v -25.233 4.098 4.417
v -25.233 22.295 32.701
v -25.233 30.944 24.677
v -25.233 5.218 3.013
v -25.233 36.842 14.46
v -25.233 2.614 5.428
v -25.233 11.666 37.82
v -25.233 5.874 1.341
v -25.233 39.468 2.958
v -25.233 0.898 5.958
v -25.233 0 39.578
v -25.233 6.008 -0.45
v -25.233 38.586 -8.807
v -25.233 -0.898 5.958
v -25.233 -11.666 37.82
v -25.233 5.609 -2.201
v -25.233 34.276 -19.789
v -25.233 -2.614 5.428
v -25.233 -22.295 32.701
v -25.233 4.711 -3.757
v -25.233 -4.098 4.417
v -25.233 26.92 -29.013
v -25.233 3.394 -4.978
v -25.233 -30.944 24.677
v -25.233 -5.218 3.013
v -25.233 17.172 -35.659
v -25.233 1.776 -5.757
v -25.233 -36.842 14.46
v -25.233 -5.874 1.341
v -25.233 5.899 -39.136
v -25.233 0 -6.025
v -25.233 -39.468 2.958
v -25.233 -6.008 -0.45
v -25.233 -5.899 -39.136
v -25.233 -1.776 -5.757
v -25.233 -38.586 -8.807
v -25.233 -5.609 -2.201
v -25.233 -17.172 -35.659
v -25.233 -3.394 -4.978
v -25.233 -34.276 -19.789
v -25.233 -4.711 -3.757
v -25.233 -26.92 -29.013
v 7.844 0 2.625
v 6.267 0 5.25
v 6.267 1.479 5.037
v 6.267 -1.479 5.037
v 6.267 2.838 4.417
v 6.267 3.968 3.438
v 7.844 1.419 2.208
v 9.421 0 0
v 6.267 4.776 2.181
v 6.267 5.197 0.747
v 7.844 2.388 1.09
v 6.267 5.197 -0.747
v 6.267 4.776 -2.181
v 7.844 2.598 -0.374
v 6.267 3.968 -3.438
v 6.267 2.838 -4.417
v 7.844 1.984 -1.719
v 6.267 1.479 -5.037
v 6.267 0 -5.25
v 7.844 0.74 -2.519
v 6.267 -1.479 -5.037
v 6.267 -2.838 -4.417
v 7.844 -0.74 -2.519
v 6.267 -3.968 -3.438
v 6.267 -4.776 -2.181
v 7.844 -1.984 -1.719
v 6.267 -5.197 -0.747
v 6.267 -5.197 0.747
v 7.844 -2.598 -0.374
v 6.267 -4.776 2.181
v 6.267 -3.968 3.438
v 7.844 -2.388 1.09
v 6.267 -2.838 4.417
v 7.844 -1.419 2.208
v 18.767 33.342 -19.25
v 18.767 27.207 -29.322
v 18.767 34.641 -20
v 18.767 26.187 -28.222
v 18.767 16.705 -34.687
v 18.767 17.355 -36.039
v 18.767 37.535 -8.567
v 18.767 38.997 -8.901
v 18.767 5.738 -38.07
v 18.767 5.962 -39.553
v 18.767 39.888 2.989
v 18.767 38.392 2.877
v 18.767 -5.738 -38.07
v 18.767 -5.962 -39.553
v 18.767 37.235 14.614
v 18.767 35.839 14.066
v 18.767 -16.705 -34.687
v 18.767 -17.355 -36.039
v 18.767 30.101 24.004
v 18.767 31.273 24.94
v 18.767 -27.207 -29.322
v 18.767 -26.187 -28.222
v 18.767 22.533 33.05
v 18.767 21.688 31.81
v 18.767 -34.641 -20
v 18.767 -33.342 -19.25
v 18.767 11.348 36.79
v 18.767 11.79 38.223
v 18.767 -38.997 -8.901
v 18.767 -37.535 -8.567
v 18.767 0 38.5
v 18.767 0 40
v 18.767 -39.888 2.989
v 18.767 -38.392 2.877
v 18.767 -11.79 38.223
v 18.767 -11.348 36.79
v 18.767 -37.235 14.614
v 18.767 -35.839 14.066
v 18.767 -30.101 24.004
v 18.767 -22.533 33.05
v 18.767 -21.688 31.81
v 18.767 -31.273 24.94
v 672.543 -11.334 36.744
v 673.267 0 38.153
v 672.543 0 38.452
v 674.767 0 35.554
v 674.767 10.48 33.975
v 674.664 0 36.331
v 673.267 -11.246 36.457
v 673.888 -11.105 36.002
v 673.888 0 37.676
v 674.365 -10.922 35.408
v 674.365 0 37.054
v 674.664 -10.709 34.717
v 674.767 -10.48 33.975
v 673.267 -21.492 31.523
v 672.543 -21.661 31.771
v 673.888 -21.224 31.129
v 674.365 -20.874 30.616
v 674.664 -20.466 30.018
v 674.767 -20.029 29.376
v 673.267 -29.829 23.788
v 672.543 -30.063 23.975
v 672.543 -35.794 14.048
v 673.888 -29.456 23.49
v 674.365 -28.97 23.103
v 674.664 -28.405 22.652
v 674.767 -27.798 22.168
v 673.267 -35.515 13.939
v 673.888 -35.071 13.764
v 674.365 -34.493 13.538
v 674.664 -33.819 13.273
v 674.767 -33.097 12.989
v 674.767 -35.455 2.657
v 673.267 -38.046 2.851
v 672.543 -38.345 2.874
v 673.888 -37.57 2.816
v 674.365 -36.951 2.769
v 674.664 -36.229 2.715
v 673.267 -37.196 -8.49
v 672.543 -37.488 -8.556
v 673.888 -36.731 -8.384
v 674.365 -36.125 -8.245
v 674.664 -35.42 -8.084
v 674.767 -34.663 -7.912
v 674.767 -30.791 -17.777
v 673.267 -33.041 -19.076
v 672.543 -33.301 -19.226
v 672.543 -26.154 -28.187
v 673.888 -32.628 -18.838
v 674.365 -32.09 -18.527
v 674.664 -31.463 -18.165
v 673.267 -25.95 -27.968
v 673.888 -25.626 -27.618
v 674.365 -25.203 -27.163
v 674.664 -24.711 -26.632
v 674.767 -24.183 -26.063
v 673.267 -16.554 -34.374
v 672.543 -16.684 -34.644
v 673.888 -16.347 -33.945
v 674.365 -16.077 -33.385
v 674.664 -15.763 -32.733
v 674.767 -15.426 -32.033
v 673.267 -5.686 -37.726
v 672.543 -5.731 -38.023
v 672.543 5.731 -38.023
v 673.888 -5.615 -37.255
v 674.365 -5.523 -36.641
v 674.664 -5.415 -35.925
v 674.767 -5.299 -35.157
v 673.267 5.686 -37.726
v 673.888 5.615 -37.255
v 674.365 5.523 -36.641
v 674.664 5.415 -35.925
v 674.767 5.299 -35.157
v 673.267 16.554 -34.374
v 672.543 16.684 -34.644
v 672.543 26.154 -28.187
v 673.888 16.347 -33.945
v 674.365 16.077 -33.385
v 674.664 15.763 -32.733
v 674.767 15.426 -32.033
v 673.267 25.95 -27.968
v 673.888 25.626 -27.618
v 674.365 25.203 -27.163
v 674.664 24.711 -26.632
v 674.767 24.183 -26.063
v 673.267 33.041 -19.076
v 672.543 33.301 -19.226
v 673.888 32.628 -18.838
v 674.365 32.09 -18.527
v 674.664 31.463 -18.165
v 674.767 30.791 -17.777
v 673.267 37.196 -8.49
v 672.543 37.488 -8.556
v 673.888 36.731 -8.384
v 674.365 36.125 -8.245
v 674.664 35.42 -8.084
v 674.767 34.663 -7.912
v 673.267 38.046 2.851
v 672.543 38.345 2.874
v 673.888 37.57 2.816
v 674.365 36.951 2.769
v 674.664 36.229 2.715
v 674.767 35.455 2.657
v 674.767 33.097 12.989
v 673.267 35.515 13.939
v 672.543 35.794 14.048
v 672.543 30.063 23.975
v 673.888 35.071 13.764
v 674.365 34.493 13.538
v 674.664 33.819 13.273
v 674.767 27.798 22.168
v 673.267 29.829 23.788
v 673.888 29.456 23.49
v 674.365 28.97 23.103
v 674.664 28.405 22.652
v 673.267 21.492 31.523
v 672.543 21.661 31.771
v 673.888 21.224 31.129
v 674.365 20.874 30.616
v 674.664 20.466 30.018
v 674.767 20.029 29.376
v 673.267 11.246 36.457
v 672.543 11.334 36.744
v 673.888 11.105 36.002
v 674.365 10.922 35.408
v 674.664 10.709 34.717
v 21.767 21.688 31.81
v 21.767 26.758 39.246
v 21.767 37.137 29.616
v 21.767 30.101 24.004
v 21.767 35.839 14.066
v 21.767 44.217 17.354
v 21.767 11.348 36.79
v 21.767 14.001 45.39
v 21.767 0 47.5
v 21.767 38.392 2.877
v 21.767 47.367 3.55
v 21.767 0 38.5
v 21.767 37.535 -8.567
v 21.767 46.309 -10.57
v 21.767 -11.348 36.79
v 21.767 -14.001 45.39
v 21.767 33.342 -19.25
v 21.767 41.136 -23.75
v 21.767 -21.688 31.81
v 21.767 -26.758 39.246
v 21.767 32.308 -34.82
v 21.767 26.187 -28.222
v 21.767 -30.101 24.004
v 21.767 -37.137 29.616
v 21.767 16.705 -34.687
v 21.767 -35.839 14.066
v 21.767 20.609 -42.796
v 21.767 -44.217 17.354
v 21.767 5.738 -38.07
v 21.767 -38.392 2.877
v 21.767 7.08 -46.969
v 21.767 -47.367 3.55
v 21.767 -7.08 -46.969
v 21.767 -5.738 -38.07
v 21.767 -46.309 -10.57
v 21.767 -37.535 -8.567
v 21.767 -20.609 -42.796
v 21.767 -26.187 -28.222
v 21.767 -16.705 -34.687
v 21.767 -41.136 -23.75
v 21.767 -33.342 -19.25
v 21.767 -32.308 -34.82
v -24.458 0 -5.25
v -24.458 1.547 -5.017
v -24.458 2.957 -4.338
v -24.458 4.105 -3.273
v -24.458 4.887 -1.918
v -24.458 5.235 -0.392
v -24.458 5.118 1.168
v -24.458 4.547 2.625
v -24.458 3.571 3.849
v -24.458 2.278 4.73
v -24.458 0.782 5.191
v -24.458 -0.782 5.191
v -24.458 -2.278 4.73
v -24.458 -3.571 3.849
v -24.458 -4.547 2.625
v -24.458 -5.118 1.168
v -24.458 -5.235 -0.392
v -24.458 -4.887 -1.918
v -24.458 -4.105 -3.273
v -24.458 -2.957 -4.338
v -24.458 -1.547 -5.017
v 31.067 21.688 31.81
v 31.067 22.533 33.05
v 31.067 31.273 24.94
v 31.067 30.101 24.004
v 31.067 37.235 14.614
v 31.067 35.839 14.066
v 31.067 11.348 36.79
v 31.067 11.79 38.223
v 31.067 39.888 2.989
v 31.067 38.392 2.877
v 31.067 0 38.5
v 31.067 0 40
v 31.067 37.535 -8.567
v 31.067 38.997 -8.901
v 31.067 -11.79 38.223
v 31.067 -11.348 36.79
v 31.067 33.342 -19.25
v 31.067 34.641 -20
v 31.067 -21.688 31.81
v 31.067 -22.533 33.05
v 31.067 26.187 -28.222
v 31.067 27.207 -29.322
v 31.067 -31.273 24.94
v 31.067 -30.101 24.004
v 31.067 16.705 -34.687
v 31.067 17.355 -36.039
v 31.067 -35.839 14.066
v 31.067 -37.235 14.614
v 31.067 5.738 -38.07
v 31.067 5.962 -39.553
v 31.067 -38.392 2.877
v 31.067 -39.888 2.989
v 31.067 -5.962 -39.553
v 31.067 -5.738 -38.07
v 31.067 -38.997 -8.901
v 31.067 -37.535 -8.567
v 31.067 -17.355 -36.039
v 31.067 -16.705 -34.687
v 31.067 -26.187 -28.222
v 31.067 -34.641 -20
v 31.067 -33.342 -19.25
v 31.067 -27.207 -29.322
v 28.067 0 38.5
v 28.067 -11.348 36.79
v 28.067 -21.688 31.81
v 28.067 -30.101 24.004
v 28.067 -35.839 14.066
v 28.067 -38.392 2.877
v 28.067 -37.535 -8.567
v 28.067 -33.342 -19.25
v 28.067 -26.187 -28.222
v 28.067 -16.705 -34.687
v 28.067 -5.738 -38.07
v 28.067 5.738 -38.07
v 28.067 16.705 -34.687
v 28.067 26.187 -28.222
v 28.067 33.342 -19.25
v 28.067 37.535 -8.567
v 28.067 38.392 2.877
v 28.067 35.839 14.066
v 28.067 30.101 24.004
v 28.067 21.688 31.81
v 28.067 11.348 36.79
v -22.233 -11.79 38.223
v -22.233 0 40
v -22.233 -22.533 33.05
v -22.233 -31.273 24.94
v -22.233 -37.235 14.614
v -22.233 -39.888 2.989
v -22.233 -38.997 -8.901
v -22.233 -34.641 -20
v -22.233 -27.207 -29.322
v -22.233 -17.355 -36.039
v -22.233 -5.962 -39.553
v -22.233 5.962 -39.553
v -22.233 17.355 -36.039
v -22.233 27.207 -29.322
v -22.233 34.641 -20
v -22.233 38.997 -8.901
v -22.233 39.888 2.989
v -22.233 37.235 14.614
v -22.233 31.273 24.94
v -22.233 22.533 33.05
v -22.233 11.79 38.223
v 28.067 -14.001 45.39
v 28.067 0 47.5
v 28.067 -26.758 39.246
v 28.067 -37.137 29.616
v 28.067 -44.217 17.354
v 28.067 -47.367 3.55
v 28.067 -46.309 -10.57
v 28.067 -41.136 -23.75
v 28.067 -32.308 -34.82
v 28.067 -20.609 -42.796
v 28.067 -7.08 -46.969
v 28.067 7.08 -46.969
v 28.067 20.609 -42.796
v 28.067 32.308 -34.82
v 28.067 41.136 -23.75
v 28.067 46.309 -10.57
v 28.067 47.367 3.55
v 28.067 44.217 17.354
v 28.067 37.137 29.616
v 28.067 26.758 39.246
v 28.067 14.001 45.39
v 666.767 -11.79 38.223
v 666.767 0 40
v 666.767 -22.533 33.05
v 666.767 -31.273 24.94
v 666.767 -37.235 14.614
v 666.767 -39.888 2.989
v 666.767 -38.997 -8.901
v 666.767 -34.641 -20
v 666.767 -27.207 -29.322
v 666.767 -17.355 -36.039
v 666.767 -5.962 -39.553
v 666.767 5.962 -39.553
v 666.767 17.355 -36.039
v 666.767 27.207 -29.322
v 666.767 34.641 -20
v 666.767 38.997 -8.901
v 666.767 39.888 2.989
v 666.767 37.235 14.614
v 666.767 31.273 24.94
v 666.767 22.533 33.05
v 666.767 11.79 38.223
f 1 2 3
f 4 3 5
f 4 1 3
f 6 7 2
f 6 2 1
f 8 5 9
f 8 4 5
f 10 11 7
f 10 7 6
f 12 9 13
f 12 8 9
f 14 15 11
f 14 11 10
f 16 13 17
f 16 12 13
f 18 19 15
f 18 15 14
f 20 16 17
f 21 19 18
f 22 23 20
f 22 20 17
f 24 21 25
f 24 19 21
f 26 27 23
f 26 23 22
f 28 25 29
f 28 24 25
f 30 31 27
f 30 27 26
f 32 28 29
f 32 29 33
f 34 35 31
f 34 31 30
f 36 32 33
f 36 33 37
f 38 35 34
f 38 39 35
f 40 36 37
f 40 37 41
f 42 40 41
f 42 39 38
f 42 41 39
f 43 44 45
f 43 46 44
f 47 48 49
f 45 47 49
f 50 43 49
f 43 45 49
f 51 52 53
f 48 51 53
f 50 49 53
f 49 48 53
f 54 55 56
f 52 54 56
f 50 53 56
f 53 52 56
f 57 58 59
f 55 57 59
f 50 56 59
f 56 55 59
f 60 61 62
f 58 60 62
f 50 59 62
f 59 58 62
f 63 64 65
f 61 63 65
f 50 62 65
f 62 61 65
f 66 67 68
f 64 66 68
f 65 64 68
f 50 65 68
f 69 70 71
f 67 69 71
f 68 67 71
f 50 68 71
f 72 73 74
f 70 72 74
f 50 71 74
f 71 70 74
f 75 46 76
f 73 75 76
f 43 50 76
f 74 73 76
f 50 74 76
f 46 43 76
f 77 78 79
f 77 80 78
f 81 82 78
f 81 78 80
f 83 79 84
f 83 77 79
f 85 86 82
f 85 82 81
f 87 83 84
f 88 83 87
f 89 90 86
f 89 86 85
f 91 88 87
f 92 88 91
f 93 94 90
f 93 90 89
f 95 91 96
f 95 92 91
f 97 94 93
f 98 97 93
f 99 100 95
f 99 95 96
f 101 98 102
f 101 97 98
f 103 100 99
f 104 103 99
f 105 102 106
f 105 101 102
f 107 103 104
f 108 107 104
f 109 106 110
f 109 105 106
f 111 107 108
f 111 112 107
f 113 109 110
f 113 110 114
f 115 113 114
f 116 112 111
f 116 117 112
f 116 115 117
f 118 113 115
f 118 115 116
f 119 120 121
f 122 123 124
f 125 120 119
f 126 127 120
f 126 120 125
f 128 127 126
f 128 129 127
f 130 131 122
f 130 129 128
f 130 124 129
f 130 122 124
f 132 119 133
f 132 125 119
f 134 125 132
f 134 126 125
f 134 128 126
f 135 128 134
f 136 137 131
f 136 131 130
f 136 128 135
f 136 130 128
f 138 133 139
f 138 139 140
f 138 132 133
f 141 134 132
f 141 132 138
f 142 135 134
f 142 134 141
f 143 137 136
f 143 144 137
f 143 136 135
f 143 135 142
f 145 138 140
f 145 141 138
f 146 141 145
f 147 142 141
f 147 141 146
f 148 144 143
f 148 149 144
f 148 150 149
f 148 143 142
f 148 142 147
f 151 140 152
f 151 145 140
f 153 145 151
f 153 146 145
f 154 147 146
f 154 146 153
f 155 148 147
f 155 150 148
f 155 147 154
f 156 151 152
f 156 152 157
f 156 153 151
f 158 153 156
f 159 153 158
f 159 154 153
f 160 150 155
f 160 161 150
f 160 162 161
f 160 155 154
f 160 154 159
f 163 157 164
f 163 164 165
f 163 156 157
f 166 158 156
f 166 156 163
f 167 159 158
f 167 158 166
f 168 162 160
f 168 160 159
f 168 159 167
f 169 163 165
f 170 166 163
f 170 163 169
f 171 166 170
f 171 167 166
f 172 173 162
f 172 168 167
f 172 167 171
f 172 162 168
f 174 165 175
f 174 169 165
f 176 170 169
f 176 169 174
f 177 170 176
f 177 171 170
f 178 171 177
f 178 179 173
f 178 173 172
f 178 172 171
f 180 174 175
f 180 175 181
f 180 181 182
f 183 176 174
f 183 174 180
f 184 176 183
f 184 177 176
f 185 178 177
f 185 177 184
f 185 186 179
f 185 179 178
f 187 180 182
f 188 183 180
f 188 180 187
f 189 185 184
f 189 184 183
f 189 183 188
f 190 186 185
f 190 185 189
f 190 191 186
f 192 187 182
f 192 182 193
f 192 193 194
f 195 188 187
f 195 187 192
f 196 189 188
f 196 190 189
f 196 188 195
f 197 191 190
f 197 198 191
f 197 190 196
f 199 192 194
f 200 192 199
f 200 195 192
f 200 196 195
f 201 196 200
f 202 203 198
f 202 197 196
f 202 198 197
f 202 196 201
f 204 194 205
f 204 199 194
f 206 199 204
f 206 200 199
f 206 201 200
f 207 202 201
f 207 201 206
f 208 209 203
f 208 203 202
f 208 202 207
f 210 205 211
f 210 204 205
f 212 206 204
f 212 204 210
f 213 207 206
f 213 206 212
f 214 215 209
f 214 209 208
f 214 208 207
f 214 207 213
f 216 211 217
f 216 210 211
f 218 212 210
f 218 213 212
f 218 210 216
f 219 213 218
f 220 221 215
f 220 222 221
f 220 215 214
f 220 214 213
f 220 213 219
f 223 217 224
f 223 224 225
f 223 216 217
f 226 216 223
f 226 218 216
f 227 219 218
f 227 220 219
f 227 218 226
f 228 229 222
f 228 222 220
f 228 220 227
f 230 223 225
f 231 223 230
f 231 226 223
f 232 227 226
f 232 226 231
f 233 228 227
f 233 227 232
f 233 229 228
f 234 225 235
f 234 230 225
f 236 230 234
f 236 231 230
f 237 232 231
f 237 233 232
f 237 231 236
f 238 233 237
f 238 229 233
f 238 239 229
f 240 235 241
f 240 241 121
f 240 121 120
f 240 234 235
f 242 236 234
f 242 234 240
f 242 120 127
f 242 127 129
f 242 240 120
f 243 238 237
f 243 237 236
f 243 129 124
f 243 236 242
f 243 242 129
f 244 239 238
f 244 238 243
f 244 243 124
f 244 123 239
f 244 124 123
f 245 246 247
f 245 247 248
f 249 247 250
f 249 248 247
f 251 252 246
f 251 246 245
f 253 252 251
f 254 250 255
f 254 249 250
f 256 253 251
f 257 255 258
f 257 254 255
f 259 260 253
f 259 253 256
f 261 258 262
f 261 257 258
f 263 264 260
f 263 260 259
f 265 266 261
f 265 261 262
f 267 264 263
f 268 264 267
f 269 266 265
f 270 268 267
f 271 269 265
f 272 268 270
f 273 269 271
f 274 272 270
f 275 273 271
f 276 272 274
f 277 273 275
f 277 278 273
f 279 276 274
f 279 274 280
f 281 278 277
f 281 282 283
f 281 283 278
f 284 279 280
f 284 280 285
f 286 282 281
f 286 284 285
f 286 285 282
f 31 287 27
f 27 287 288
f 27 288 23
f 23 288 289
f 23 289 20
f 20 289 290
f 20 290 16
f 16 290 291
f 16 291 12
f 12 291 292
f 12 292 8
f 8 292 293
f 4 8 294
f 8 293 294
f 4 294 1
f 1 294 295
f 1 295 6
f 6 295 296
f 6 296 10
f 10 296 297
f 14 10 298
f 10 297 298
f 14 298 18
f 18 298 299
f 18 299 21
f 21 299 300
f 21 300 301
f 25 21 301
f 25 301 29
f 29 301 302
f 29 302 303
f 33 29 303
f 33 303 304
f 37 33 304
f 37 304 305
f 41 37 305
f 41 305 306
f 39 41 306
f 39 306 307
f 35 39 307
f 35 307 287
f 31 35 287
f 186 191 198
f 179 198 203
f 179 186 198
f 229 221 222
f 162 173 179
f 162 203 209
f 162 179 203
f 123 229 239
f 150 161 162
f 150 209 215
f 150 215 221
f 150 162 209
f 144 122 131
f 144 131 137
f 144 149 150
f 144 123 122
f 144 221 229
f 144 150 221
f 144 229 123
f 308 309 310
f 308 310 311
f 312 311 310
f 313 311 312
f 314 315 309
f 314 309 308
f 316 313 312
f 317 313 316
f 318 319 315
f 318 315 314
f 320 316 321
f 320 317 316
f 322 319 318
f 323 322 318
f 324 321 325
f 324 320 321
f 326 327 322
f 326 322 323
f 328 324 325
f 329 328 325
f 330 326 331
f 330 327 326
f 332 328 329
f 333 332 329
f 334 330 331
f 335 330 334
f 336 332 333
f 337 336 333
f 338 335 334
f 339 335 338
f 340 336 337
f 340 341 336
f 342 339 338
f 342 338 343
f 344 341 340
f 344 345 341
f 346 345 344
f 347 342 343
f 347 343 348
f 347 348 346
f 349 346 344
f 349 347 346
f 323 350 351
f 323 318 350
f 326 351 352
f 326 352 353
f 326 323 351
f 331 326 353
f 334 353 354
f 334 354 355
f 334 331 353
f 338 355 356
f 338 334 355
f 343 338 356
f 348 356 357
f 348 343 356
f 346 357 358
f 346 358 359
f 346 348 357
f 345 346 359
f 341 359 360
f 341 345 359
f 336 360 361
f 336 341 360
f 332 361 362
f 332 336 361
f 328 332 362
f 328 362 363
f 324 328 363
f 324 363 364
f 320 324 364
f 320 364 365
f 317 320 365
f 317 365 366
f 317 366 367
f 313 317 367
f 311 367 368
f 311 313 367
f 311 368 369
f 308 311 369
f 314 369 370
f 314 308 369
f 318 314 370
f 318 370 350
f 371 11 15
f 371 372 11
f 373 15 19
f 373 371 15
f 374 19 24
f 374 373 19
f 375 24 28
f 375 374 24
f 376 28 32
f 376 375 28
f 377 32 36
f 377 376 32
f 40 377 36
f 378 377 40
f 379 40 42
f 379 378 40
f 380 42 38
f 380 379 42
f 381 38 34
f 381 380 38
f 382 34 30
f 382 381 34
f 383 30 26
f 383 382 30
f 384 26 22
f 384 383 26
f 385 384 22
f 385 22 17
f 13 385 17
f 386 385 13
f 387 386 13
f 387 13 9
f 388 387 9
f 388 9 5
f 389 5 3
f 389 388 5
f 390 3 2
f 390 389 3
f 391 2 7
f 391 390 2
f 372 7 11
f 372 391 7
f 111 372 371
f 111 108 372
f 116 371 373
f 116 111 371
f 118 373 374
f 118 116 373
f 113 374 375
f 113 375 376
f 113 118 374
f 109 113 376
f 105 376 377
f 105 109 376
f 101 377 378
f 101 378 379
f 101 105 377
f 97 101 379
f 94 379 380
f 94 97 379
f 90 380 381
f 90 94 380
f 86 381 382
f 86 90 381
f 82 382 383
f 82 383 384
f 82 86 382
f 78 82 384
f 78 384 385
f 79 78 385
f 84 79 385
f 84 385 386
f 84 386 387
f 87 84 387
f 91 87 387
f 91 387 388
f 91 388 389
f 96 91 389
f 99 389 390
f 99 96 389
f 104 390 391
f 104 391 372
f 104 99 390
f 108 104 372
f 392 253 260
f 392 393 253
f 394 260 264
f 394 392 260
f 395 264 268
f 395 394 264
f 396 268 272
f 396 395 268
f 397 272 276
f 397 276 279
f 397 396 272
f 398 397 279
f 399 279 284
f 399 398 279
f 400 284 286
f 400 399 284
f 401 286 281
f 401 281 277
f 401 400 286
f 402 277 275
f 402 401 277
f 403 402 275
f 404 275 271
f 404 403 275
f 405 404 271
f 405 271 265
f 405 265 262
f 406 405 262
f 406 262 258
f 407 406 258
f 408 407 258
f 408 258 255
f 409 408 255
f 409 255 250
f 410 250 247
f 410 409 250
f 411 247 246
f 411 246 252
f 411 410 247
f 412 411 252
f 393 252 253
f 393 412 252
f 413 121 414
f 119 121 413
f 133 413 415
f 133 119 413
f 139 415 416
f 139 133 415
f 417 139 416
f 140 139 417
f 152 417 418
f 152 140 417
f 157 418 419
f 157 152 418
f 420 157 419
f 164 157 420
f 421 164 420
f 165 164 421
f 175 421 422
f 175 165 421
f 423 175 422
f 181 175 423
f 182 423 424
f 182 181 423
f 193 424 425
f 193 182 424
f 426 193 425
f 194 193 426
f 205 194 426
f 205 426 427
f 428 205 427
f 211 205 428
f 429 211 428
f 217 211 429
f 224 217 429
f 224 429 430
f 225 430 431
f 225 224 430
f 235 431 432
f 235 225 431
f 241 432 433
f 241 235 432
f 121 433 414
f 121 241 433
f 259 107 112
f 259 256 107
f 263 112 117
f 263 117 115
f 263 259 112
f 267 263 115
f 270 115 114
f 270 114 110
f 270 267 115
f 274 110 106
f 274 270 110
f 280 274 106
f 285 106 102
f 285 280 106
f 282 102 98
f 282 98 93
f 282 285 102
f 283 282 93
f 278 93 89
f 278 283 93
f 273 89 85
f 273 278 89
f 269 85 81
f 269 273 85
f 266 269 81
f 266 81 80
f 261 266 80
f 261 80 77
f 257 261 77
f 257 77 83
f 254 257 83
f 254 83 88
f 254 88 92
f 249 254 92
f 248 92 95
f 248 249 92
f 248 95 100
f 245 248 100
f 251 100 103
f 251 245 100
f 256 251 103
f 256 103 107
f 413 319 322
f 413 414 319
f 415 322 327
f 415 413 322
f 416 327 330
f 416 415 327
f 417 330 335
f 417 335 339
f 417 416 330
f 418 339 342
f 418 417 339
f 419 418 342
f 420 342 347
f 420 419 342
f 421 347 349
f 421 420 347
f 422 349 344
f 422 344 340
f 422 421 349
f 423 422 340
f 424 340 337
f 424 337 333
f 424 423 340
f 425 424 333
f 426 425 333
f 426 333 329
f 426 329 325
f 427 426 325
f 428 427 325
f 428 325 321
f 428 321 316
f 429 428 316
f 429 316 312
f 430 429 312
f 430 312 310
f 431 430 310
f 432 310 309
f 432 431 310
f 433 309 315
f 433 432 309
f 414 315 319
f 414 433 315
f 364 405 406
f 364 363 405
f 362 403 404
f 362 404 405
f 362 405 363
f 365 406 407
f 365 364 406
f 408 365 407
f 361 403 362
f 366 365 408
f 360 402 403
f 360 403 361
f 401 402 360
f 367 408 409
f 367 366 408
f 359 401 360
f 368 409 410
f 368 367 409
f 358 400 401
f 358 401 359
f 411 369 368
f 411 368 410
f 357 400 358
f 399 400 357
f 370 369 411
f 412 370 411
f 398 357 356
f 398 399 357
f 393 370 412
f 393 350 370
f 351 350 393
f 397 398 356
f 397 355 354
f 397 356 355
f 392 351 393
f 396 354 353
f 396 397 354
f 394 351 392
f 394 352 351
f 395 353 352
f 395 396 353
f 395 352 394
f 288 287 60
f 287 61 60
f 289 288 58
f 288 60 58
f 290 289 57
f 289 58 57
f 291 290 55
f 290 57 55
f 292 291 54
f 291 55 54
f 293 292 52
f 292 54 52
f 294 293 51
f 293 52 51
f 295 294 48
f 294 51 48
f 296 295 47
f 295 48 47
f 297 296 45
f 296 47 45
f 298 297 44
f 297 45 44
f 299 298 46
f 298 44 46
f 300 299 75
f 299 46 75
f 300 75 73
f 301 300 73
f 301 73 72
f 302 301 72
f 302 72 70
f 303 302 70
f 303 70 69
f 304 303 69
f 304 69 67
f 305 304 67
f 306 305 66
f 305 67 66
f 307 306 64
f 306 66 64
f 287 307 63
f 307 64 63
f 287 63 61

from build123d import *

# Parameters (mm, degrees)
OTW_R_GWINTOWANY_M12X1_51_D           = 10.5
OTW_R_GWINTOWANY_M12X1_51_DEPTH       = 31.5
OTW_R_GWINTOWANY_M12X1_51_CSINK_D     = 12.05
OTW_R_GWINTOWANY_M12X1_51_CSINK_ANGLE = 90
OTW_R_GWINTOWANY_M12X1_51_TIP         = 3.15451825


with BuildPart() as part:
    # Sketch1 → Base-Revolve (revolve)
    with BuildSketch(Plane.XY, mode=Mode.PRIVATE) as base_revolve_sk:
        with BuildLine():
            Line((-22.233400605, 40), (18.766599395, 40))
            Line((18.766599395, 40), (18.766599395, 38.5))
            Line((18.766599395, 38.5), (21.766599395, 38.5))
            Line((21.766599395, 38.5), (21.766599395, 47.5))
            Line((21.766599395, 47.5), (28.066599395, 47.5))
            Line((28.066599395, 47.5), (28.066599395, 38.5))
            Line((28.066599395, 38.5), (31.066599395, 38.5))
            Line((31.066599395, 38.5), (31.066599395, 40))
            Line((31.066599395, 40), (666.766599395, 40))
            Line((666.766599395, 40), (672.54305653, 38.452202975))
            ThreePointArc((672.54305653, 38.452202975), (674.146659415, 37.380709784), (674.766599395, 35.554425497))
            Line((674.766599395, 35.554425497), (674.766599395, 0))
            Line((674.766599395, 0), (-25.233400605, 0))
            Line((-25.233400605, 0), (-25.233400605, 39.578377496))
            Line((-25.233400605, 39.578377496), (-22.233400605, 40))
        make_face()
    revolve(base_revolve_sk.sketch.rotate(Axis((-25.233400605, 0, 0), (1, 0, 0)), 90), axis=Axis((-25.233400605, 0, 0), (1, 0, 0)))

    # Otwór gwintowany M12x1.51
    with Locations(Plane.ZY.offset(25.233400605)):
        with Locations((0, 0)):
            CounterSinkHole(OTW_R_GWINTOWANY_M12X1_51_D / 2, OTW_R_GWINTOWANY_M12X1_51_CSINK_D / 2, depth=OTW_R_GWINTOWANY_M12X1_51_DEPTH, counter_sink_angle=OTW_R_GWINTOWANY_M12X1_51_CSINK_ANGLE)
            with Locations((0, 0, -(OTW_R_GWINTOWANY_M12X1_51_DEPTH + OTW_R_GWINTOWANY_M12X1_51_TIP / 2))):  # 118° drill point
                Cone(0, OTW_R_GWINTOWANY_M12X1_51_D / 2, OTW_R_GWINTOWANY_M12X1_51_TIP, mode=Mode.SUBTRACT)


solid = part.part
